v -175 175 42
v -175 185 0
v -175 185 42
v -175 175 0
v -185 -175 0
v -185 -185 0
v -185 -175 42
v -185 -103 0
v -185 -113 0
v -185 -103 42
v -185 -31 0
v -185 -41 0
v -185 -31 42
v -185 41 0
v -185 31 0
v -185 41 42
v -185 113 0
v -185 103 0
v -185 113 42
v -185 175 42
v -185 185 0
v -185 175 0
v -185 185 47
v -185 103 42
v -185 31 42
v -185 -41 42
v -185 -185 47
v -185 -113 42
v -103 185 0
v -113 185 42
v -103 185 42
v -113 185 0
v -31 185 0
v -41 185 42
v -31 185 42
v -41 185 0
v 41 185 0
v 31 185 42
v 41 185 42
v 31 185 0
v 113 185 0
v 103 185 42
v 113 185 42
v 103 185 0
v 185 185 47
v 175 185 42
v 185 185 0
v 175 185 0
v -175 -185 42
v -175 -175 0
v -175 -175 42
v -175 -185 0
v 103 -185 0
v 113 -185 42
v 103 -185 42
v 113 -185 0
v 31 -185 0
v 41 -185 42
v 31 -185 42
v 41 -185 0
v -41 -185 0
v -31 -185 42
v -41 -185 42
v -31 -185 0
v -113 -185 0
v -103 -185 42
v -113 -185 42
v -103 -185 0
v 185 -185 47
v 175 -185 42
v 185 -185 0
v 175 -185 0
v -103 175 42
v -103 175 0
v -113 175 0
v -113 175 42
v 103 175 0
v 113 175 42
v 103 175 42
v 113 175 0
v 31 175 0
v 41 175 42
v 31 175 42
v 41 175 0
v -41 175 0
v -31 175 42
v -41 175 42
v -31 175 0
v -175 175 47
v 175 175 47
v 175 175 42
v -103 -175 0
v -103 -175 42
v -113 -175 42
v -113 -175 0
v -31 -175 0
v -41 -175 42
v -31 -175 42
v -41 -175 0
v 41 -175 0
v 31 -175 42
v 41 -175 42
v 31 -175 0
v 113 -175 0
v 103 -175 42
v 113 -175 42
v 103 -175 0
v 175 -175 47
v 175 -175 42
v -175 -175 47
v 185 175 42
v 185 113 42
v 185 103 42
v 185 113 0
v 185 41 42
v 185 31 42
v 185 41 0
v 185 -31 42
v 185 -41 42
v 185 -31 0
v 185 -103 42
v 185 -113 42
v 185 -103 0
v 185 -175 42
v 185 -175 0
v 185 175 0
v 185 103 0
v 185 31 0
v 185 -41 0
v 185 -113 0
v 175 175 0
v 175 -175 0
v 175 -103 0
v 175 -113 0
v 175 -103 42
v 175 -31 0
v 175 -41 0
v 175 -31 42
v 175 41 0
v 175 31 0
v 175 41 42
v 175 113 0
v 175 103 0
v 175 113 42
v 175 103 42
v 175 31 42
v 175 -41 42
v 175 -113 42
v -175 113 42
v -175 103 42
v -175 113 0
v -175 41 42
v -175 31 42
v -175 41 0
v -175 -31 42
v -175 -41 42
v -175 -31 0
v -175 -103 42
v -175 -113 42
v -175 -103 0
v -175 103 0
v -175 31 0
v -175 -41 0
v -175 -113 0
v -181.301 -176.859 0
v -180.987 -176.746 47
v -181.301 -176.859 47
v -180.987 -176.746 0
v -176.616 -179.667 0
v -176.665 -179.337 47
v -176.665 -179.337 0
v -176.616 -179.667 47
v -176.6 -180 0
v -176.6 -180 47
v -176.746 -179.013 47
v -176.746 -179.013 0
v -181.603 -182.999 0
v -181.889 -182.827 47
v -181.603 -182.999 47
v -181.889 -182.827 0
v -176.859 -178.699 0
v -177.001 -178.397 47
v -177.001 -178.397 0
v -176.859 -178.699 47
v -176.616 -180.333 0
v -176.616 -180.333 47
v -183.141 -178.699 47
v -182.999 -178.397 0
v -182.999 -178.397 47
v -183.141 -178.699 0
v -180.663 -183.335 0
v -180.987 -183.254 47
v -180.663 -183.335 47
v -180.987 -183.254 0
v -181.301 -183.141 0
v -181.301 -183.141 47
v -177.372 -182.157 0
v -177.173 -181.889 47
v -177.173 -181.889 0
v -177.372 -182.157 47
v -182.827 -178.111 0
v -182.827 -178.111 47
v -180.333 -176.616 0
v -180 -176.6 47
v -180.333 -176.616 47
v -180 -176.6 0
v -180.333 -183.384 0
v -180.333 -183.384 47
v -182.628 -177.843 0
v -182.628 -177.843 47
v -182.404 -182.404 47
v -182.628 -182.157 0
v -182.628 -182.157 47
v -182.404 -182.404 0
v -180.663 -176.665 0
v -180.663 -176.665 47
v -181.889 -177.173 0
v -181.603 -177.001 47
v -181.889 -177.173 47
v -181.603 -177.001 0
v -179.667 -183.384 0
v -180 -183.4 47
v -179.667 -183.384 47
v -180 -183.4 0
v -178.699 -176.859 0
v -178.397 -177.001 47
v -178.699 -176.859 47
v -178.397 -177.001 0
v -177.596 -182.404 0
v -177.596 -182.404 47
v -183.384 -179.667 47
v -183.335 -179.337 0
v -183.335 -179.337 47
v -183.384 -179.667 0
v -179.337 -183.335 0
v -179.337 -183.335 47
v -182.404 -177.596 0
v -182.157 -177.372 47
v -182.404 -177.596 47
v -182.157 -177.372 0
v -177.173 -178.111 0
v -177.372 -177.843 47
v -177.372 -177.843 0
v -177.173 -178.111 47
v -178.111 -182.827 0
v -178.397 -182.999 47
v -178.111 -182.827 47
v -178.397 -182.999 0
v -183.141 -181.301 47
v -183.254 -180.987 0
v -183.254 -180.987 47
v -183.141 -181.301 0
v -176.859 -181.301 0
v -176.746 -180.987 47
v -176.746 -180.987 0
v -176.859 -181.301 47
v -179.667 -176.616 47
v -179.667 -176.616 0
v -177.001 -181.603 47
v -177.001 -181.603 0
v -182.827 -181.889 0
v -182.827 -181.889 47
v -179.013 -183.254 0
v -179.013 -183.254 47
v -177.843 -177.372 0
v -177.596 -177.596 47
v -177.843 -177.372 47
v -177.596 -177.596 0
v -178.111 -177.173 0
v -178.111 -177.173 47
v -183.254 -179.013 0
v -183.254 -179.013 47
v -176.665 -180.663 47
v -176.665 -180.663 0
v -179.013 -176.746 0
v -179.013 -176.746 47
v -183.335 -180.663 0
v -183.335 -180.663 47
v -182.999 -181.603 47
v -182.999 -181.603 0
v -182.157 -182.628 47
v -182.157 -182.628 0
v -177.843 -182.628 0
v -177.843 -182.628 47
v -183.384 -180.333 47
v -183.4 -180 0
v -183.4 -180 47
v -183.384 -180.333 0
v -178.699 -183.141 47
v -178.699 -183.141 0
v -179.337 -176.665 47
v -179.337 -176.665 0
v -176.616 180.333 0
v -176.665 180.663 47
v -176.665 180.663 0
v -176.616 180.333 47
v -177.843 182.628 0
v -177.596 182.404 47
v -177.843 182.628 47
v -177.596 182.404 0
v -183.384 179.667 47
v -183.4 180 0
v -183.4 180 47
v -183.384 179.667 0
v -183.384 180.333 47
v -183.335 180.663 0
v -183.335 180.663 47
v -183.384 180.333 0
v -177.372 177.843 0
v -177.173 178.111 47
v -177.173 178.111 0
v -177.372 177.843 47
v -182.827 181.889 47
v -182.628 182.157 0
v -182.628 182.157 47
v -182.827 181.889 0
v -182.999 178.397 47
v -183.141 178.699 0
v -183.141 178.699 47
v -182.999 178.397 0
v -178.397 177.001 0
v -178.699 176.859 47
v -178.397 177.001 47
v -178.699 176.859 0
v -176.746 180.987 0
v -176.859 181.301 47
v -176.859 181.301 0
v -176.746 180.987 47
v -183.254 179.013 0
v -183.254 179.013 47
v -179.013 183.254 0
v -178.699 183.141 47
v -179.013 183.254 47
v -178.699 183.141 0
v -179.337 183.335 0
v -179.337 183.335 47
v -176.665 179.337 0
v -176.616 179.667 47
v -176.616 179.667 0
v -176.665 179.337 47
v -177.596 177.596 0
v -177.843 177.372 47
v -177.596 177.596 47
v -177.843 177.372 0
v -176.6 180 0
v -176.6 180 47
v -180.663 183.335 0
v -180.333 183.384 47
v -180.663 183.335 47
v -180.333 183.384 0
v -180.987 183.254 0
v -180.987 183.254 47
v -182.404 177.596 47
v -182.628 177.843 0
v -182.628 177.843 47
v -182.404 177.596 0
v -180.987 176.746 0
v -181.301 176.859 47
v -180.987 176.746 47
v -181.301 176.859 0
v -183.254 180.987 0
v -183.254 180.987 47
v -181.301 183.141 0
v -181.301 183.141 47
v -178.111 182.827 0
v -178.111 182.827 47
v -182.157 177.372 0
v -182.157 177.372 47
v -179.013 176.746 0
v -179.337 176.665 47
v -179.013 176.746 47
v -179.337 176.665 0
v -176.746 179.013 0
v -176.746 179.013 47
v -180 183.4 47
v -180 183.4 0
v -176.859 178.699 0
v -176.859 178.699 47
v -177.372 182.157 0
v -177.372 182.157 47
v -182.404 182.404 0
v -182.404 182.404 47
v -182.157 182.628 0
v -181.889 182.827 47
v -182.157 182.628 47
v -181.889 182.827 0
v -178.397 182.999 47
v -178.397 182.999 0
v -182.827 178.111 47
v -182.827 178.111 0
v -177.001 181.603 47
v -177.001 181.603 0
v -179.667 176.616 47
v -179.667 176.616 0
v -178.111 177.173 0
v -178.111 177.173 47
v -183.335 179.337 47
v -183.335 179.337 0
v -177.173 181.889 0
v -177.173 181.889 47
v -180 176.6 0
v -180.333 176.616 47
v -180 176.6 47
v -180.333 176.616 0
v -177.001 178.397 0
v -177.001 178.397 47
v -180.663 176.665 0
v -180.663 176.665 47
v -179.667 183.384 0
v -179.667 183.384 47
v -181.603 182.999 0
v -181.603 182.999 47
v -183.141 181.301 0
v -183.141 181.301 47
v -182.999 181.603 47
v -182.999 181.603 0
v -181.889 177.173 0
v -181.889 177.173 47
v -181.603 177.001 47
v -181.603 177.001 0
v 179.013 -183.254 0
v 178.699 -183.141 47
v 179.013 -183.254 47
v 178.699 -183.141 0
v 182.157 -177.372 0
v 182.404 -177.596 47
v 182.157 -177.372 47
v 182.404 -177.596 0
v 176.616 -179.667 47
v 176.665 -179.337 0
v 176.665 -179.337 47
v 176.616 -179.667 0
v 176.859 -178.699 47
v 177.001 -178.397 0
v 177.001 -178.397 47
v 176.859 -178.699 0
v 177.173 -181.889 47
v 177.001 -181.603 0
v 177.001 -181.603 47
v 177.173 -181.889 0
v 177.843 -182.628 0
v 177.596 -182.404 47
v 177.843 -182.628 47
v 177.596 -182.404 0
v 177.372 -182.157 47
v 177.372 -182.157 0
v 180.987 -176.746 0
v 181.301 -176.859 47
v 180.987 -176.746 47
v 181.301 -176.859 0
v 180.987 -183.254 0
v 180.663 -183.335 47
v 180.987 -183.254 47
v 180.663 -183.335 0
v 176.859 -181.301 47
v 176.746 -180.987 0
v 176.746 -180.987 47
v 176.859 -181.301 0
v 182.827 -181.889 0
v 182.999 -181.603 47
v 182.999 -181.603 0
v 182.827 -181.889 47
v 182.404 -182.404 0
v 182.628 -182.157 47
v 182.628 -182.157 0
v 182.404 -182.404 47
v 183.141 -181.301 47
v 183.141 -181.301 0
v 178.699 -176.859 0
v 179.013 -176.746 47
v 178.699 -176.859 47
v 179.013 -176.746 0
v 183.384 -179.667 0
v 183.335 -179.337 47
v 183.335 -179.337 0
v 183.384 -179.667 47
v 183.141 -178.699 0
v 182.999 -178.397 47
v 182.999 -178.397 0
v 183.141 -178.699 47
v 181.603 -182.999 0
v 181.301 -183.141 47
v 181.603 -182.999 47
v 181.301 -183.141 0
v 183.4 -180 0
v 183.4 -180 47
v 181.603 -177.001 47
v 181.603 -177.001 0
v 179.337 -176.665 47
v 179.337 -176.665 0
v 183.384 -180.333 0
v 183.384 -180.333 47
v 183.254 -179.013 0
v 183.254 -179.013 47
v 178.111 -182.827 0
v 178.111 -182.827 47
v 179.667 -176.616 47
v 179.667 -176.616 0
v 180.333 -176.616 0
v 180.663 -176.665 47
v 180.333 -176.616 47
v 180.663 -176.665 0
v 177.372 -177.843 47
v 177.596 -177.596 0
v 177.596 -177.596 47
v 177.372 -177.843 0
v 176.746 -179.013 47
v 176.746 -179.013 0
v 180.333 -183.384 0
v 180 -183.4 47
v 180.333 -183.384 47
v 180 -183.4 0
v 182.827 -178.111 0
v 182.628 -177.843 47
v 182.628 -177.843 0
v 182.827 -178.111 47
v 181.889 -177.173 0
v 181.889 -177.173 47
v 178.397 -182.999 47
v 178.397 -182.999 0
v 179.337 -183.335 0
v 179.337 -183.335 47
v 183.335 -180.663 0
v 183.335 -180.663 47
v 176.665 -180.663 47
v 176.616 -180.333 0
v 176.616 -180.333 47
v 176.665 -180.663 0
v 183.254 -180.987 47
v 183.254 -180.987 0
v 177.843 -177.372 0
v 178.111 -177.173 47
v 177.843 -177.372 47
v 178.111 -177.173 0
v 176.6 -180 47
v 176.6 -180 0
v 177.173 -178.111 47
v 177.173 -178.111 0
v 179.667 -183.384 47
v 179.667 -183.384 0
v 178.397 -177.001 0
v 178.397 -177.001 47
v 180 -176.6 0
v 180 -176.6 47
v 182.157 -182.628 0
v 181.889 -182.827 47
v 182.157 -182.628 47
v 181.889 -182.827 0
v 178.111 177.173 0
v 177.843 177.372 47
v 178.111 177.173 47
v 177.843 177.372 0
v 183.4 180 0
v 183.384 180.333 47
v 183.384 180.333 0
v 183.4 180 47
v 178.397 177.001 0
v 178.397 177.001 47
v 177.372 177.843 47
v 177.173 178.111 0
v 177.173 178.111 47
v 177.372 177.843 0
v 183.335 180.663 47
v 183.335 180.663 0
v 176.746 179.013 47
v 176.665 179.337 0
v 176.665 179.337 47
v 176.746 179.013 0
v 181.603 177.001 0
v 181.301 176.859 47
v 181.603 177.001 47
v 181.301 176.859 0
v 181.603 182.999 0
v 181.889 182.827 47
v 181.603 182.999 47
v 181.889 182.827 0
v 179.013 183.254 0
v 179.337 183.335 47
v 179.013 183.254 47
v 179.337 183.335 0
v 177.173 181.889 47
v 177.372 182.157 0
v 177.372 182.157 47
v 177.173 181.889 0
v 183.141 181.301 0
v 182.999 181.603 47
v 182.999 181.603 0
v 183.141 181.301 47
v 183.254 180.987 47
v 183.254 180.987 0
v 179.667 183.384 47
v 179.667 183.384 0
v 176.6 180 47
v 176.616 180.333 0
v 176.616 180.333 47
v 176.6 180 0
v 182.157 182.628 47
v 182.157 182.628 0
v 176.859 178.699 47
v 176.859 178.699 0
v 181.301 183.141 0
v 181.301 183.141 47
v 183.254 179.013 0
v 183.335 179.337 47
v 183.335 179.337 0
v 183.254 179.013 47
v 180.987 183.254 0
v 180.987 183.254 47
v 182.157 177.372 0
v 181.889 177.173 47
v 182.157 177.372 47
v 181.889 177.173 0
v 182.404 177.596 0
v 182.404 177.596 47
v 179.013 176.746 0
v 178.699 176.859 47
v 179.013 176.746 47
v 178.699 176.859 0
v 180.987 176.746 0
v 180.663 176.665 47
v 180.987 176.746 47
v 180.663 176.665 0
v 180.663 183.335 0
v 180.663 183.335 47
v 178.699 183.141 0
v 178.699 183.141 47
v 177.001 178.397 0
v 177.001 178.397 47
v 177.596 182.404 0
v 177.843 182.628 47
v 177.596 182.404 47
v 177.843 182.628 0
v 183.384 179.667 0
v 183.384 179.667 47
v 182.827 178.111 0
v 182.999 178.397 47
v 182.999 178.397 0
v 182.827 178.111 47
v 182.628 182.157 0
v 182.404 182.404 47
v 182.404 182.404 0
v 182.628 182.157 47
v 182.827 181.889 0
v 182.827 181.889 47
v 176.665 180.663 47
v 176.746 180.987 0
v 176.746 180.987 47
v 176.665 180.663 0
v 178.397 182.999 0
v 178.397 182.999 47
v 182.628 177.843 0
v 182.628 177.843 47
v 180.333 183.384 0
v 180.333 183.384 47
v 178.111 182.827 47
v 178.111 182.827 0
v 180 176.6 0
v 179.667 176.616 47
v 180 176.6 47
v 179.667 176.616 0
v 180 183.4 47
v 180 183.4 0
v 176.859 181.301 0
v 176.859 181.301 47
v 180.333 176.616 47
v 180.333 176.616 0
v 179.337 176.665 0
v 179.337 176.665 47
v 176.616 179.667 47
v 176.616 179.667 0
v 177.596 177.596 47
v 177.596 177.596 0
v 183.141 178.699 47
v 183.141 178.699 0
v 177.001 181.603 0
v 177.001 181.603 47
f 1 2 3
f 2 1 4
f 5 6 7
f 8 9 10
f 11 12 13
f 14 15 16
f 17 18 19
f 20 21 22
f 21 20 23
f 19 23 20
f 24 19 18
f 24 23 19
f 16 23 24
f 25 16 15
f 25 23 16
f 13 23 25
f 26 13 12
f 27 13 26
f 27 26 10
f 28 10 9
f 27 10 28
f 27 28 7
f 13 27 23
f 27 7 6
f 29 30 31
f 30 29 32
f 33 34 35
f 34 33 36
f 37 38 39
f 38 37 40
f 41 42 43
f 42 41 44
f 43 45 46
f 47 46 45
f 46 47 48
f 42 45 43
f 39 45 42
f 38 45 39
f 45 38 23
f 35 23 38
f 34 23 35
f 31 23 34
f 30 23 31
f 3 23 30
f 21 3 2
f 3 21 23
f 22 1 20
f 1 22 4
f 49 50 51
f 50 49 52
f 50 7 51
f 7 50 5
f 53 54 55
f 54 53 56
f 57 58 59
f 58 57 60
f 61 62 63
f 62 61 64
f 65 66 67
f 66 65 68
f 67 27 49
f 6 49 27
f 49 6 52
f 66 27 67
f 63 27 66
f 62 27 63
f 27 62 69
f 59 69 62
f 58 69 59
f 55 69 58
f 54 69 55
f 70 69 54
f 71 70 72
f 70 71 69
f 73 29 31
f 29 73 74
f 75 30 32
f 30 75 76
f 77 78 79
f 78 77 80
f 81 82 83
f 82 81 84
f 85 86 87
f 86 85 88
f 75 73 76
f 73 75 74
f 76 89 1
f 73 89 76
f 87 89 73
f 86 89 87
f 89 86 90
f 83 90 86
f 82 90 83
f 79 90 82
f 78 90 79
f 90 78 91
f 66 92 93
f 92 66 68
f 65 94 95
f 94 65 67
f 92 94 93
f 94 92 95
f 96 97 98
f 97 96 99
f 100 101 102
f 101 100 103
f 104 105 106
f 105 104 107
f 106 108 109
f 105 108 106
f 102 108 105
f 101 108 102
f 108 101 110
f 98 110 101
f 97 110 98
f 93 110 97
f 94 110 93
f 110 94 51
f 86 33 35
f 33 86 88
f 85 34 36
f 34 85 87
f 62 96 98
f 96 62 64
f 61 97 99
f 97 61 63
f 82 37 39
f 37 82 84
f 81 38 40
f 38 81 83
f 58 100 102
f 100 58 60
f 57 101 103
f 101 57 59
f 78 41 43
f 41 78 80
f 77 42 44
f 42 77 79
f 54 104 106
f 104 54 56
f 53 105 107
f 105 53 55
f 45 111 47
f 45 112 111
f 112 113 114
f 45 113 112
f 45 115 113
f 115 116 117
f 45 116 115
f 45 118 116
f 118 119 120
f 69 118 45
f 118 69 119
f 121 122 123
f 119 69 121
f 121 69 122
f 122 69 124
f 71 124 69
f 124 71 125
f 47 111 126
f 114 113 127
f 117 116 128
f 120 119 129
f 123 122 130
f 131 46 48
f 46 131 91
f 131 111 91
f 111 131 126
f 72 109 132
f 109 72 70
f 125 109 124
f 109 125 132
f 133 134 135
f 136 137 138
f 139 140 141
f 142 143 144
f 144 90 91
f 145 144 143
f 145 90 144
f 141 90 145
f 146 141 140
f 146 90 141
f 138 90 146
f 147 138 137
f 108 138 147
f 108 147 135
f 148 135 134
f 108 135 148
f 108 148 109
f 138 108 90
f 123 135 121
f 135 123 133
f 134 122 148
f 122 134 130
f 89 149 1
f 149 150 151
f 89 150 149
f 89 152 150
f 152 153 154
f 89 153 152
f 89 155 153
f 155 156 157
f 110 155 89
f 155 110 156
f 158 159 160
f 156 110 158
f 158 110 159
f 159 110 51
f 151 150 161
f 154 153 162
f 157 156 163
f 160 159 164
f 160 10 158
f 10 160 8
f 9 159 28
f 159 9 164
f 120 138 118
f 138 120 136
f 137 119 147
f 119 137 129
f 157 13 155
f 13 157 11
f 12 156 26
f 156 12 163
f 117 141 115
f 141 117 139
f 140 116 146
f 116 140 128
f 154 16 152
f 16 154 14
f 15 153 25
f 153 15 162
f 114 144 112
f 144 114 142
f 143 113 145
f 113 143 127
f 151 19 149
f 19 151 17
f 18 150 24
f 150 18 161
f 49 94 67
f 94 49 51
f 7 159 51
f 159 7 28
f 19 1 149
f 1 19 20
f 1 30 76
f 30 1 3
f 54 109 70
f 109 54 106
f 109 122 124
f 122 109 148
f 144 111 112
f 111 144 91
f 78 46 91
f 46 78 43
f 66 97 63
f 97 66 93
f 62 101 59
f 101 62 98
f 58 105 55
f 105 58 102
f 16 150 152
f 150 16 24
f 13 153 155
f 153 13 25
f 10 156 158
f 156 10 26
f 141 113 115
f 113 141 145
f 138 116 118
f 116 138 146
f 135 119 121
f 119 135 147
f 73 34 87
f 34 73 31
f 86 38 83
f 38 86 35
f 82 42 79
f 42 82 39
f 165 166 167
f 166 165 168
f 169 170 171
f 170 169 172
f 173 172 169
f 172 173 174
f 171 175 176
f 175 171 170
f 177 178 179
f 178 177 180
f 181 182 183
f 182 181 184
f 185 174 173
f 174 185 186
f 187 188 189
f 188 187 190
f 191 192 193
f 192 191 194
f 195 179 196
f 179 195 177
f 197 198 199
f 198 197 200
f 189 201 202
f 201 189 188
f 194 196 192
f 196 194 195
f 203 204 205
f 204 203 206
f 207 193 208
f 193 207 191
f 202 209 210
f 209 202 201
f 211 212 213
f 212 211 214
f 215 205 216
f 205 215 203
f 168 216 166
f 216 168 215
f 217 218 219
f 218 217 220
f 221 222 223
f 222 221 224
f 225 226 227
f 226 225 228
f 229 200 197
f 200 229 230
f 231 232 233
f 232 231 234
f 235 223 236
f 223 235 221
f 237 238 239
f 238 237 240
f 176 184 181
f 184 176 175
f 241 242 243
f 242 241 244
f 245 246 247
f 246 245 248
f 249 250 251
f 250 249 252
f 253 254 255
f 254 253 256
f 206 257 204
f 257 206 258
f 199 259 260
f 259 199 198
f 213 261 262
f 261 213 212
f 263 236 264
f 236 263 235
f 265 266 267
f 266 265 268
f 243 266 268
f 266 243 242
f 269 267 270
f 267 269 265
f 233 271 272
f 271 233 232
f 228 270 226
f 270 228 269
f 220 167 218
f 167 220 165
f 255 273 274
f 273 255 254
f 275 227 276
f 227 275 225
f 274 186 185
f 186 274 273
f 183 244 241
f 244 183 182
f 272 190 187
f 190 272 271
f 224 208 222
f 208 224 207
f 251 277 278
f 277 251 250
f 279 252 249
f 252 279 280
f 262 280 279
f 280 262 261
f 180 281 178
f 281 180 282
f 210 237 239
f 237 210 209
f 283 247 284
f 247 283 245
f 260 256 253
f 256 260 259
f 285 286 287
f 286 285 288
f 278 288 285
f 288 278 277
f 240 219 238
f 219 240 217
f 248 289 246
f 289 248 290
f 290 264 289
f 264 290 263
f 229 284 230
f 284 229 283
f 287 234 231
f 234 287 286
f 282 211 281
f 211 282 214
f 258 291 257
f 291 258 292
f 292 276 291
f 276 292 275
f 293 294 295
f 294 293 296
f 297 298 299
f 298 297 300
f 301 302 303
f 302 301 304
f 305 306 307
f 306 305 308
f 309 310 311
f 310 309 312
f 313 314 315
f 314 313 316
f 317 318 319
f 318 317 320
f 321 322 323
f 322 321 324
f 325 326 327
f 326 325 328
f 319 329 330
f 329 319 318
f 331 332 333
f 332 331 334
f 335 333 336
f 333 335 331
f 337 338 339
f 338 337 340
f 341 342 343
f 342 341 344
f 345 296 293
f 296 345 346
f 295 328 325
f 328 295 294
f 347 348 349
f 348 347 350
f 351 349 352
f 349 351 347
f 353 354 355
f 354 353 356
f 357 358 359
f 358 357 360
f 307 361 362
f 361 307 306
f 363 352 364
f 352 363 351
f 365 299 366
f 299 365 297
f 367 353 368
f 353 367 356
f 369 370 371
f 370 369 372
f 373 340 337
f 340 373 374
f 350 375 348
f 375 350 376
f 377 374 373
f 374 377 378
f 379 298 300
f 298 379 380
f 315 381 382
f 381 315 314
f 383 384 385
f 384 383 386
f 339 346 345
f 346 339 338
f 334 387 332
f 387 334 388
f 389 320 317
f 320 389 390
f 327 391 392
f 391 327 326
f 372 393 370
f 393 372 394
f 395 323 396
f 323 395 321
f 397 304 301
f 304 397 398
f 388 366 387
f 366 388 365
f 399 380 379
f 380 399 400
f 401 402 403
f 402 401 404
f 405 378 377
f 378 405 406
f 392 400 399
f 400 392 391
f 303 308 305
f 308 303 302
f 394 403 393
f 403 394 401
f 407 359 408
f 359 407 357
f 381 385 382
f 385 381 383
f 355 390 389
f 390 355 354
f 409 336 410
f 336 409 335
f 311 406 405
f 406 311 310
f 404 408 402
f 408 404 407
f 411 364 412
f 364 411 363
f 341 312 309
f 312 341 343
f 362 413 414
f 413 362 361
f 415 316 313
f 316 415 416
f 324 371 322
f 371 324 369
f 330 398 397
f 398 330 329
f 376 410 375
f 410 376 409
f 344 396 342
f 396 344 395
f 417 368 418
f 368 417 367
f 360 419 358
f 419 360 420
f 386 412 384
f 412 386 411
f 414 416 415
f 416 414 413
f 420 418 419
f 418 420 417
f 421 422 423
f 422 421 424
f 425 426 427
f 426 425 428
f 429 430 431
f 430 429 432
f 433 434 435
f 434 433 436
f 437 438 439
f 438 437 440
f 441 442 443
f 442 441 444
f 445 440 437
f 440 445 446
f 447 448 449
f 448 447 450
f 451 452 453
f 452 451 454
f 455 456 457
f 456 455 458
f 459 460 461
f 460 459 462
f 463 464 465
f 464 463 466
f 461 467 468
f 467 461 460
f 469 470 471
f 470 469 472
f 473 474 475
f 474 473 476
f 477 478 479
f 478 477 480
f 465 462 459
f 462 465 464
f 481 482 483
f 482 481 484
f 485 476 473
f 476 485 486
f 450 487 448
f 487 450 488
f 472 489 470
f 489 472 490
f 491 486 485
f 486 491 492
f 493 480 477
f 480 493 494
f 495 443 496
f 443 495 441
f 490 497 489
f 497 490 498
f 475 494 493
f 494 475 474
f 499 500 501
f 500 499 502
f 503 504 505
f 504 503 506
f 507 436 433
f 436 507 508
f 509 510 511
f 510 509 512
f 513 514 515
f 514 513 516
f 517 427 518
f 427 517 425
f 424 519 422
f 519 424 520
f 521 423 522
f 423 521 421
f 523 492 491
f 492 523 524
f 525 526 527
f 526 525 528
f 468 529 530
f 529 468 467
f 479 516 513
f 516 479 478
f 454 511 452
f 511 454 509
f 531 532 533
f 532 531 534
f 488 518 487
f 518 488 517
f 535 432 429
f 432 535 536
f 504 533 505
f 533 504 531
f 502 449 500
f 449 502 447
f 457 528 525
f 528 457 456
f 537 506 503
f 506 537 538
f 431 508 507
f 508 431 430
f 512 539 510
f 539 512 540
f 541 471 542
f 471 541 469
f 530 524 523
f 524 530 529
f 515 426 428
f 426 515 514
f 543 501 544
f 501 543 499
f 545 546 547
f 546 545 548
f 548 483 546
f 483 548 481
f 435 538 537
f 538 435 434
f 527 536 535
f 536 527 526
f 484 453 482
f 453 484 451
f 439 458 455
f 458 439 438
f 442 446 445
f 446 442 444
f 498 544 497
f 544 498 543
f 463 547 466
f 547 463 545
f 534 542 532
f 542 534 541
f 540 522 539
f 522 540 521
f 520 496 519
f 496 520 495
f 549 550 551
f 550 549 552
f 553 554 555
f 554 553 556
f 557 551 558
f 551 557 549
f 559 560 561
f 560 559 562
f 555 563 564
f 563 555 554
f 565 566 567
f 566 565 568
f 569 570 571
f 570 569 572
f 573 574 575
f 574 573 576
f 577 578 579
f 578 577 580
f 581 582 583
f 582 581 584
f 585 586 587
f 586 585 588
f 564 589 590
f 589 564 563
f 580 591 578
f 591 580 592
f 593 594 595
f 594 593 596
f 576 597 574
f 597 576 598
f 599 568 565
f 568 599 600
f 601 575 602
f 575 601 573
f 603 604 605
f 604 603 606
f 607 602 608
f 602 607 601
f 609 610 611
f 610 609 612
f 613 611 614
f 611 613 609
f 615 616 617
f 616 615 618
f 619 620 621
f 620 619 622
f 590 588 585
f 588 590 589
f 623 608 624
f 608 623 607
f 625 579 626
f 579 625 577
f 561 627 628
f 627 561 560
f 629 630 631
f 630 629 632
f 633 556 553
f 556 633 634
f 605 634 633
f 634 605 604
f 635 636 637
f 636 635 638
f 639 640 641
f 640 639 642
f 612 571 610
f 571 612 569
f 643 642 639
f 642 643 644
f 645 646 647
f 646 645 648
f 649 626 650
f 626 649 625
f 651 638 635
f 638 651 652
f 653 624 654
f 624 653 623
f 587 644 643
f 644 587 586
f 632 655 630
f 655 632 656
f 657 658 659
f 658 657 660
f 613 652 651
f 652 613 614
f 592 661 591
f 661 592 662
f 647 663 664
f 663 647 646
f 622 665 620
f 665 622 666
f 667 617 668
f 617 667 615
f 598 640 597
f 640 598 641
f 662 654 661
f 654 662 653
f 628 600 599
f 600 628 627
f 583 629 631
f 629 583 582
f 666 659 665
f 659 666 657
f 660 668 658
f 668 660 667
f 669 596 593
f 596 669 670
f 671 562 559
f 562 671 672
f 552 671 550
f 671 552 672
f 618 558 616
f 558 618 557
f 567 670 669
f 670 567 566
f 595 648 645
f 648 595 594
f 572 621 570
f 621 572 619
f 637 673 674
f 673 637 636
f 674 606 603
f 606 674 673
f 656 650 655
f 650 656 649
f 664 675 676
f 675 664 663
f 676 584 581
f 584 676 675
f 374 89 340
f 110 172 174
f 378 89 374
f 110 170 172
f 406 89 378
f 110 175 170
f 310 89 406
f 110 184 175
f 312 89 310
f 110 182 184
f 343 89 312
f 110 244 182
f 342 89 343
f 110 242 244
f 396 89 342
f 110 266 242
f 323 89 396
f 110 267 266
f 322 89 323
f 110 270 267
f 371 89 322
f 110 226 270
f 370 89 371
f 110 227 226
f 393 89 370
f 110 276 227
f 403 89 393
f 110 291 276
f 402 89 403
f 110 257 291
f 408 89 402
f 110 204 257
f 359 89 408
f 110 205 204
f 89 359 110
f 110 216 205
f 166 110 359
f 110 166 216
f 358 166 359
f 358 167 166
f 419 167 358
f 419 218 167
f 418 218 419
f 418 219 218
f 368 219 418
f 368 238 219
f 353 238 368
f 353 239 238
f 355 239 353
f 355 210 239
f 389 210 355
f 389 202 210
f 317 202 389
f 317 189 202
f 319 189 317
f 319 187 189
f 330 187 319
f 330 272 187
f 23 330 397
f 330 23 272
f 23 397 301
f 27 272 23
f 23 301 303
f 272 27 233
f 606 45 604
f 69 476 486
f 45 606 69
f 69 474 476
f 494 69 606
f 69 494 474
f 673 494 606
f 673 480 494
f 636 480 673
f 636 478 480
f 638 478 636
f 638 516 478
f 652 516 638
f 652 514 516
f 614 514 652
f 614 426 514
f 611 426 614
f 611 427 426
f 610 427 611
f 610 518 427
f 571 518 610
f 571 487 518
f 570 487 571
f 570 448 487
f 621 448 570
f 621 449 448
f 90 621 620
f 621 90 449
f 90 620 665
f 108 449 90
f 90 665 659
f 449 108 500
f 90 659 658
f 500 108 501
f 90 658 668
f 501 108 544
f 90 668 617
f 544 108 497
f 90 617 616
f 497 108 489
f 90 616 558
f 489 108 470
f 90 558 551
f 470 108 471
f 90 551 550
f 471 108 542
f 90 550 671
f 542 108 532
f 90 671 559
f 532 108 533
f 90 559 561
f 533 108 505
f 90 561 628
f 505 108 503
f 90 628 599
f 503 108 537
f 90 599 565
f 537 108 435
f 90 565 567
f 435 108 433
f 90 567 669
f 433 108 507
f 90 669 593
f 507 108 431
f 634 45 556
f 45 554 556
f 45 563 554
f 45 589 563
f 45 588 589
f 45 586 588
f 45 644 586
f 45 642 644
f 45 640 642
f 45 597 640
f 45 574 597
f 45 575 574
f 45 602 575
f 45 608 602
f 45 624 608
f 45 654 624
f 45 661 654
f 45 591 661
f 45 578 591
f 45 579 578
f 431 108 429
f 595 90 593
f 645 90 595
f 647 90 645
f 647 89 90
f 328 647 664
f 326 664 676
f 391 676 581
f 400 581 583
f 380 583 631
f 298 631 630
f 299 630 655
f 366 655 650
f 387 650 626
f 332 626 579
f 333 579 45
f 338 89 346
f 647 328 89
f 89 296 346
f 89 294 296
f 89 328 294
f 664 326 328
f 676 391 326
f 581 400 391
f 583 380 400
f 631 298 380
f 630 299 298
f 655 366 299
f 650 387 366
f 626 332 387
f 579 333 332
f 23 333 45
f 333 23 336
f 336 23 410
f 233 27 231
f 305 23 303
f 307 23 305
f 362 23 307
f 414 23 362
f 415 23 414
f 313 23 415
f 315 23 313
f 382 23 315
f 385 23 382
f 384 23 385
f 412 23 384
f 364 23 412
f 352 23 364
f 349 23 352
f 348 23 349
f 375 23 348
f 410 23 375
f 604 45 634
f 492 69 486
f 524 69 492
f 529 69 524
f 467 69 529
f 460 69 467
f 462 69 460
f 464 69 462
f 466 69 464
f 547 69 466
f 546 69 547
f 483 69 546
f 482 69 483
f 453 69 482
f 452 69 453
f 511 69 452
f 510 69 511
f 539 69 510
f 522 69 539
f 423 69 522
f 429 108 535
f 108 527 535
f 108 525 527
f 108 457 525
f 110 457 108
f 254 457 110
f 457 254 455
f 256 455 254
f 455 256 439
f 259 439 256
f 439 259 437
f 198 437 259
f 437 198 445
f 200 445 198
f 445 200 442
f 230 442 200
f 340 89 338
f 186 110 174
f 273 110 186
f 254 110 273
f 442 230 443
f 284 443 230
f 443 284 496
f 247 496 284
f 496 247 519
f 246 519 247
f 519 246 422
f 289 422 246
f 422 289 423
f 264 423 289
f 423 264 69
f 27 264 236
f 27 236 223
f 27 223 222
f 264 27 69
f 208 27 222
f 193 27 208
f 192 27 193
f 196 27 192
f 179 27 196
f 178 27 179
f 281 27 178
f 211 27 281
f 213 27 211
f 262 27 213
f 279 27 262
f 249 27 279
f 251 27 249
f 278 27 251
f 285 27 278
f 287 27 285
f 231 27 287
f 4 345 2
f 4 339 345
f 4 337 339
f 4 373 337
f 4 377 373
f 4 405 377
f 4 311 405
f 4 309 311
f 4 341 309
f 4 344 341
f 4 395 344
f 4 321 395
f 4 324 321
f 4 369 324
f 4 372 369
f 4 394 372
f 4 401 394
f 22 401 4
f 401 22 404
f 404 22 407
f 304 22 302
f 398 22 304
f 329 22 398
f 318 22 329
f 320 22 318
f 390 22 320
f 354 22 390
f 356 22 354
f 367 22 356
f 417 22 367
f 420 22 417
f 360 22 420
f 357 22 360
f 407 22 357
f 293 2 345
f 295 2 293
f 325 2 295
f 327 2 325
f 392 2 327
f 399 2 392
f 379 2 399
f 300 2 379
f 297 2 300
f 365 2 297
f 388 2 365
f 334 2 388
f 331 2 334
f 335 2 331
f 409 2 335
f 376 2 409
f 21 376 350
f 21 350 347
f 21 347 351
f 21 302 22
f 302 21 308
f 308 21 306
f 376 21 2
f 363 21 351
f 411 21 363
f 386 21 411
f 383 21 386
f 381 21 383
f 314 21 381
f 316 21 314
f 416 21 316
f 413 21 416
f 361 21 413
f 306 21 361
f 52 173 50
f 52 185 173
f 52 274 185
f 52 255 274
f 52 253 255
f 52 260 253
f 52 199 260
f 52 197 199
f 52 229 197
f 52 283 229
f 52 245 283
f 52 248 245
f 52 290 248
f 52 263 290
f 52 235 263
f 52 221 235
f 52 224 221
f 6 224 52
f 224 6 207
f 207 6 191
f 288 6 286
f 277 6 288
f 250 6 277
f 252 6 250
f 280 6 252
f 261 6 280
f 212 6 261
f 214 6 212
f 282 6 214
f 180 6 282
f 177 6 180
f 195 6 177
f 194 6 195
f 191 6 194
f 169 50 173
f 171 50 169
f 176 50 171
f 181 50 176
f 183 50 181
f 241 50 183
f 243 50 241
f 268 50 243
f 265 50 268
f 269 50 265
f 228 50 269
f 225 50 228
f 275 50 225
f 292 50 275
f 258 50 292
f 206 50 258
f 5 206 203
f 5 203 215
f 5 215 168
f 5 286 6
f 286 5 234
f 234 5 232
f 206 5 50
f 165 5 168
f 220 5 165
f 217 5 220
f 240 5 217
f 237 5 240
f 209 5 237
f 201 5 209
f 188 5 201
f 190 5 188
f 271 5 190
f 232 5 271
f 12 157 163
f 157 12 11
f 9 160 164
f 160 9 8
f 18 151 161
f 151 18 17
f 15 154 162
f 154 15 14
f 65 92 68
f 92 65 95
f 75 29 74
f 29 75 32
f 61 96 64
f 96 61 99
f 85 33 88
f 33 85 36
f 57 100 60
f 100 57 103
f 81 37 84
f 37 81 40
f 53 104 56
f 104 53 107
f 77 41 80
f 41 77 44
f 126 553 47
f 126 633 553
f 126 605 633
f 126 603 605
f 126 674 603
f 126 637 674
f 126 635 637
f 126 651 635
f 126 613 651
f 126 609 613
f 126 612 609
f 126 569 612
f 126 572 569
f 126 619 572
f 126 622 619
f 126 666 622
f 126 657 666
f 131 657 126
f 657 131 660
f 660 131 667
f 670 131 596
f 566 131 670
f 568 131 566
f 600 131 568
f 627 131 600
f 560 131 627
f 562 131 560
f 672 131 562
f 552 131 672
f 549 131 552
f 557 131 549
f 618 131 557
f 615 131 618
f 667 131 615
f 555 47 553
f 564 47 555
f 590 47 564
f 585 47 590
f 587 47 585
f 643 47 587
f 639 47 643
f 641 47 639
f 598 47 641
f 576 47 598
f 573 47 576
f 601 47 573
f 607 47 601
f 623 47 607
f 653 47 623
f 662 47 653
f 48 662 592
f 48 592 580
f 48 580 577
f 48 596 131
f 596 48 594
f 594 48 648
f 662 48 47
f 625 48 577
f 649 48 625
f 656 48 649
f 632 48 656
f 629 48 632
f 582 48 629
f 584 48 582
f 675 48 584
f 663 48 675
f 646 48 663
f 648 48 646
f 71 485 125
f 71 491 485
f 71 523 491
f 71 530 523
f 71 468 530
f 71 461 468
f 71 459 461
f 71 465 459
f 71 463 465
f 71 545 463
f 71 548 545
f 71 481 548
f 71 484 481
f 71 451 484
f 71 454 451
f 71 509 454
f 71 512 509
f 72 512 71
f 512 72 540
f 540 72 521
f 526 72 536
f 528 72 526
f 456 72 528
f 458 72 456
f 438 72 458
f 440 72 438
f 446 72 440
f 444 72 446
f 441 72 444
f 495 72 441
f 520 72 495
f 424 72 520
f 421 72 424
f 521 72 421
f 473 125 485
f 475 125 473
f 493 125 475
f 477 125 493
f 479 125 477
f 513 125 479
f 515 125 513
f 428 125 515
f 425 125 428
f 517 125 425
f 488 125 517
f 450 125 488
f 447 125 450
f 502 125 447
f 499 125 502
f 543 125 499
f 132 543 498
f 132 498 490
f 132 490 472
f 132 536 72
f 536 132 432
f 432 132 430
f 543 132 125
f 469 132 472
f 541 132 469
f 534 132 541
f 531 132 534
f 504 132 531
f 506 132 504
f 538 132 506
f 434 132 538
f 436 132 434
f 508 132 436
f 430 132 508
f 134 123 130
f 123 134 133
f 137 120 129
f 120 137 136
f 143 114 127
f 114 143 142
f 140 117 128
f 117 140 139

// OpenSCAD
// Cage slice part (z0..z1). Units: mm.
// Print orientation: normal

bar=10;
inner=[350,350,700];
gap_xy=62;
gap_z=61;
hole_d=6.8;
$fn=64;

outer=[inner[0]+2*bar, inner[1]+2*bar, inner[2]+2*bar];
half=[outer[0]/2, outer[1]/2, outer[2]/2];

pitch_xy=bar+gap_xy;
pitch_z=bar+gap_z;

centers=[for(i=[0:5]) -(half[0]-bar/2) + i*pitch_xy];
z_levels=[for(i=[0:10]) i*pitch_z];

module vbar(xc,yc){ translate([xc-bar/2,yc-bar/2,0]) cube([bar,bar,outer[2]],center=false); }
module hbar_x(yc,z0){ translate([-half[0],yc-bar/2,z0]) cube([outer[0],bar,bar],center=false); }
module hbar_y(xc,z0){ translate([xc-bar/2,-half[1],z0]) cube([bar,outer[1],bar],center=false); }

module grid(z0){ union(){ for(yc=centers) hbar_x(yc,z0); for(xc=centers) hbar_y(xc,z0); } }

module side_verticals(){
  union(){
    for(xc=centers){ vbar(xc, half[1]-bar/2); vbar(xc,-half[1]+bar/2); }
    for(yc=centers){ vbar( half[0]-bar/2,yc); vbar(-half[0]+bar/2,yc); }
  }
}

module side_rings(){
  union(){
    for(z0=z_levels){
      hbar_x( half[1]-bar/2,z0); hbar_x(-half[1]+bar/2,z0);
      hbar_y( half[0]-bar/2,z0); hbar_y(-half[0]+bar/2,z0);
    }
  }
}

module rod_holes(){
  for(sx=[-1,1],sy=[-1,1]) translate([sx*(half[0]-bar/2), sy*(half[1]-bar/2), -1]) cylinder(d=hole_d,h=outer[2]+2,center=false);
}

module cage(){ difference(){ union(){ side_verticals(); side_rings(); grid(0); grid(outer[2]-bar); } rod_holes(); } }

module cage_slice(zmin,zmax){ intersection(){ cage(); translate([-1000,-1000,zmin]) cube([2000,2000,zmax-zmin],center=false); } }

z0=100; z1=147;
translate([0,0,-z0]) cage_slice(z0,z1);
